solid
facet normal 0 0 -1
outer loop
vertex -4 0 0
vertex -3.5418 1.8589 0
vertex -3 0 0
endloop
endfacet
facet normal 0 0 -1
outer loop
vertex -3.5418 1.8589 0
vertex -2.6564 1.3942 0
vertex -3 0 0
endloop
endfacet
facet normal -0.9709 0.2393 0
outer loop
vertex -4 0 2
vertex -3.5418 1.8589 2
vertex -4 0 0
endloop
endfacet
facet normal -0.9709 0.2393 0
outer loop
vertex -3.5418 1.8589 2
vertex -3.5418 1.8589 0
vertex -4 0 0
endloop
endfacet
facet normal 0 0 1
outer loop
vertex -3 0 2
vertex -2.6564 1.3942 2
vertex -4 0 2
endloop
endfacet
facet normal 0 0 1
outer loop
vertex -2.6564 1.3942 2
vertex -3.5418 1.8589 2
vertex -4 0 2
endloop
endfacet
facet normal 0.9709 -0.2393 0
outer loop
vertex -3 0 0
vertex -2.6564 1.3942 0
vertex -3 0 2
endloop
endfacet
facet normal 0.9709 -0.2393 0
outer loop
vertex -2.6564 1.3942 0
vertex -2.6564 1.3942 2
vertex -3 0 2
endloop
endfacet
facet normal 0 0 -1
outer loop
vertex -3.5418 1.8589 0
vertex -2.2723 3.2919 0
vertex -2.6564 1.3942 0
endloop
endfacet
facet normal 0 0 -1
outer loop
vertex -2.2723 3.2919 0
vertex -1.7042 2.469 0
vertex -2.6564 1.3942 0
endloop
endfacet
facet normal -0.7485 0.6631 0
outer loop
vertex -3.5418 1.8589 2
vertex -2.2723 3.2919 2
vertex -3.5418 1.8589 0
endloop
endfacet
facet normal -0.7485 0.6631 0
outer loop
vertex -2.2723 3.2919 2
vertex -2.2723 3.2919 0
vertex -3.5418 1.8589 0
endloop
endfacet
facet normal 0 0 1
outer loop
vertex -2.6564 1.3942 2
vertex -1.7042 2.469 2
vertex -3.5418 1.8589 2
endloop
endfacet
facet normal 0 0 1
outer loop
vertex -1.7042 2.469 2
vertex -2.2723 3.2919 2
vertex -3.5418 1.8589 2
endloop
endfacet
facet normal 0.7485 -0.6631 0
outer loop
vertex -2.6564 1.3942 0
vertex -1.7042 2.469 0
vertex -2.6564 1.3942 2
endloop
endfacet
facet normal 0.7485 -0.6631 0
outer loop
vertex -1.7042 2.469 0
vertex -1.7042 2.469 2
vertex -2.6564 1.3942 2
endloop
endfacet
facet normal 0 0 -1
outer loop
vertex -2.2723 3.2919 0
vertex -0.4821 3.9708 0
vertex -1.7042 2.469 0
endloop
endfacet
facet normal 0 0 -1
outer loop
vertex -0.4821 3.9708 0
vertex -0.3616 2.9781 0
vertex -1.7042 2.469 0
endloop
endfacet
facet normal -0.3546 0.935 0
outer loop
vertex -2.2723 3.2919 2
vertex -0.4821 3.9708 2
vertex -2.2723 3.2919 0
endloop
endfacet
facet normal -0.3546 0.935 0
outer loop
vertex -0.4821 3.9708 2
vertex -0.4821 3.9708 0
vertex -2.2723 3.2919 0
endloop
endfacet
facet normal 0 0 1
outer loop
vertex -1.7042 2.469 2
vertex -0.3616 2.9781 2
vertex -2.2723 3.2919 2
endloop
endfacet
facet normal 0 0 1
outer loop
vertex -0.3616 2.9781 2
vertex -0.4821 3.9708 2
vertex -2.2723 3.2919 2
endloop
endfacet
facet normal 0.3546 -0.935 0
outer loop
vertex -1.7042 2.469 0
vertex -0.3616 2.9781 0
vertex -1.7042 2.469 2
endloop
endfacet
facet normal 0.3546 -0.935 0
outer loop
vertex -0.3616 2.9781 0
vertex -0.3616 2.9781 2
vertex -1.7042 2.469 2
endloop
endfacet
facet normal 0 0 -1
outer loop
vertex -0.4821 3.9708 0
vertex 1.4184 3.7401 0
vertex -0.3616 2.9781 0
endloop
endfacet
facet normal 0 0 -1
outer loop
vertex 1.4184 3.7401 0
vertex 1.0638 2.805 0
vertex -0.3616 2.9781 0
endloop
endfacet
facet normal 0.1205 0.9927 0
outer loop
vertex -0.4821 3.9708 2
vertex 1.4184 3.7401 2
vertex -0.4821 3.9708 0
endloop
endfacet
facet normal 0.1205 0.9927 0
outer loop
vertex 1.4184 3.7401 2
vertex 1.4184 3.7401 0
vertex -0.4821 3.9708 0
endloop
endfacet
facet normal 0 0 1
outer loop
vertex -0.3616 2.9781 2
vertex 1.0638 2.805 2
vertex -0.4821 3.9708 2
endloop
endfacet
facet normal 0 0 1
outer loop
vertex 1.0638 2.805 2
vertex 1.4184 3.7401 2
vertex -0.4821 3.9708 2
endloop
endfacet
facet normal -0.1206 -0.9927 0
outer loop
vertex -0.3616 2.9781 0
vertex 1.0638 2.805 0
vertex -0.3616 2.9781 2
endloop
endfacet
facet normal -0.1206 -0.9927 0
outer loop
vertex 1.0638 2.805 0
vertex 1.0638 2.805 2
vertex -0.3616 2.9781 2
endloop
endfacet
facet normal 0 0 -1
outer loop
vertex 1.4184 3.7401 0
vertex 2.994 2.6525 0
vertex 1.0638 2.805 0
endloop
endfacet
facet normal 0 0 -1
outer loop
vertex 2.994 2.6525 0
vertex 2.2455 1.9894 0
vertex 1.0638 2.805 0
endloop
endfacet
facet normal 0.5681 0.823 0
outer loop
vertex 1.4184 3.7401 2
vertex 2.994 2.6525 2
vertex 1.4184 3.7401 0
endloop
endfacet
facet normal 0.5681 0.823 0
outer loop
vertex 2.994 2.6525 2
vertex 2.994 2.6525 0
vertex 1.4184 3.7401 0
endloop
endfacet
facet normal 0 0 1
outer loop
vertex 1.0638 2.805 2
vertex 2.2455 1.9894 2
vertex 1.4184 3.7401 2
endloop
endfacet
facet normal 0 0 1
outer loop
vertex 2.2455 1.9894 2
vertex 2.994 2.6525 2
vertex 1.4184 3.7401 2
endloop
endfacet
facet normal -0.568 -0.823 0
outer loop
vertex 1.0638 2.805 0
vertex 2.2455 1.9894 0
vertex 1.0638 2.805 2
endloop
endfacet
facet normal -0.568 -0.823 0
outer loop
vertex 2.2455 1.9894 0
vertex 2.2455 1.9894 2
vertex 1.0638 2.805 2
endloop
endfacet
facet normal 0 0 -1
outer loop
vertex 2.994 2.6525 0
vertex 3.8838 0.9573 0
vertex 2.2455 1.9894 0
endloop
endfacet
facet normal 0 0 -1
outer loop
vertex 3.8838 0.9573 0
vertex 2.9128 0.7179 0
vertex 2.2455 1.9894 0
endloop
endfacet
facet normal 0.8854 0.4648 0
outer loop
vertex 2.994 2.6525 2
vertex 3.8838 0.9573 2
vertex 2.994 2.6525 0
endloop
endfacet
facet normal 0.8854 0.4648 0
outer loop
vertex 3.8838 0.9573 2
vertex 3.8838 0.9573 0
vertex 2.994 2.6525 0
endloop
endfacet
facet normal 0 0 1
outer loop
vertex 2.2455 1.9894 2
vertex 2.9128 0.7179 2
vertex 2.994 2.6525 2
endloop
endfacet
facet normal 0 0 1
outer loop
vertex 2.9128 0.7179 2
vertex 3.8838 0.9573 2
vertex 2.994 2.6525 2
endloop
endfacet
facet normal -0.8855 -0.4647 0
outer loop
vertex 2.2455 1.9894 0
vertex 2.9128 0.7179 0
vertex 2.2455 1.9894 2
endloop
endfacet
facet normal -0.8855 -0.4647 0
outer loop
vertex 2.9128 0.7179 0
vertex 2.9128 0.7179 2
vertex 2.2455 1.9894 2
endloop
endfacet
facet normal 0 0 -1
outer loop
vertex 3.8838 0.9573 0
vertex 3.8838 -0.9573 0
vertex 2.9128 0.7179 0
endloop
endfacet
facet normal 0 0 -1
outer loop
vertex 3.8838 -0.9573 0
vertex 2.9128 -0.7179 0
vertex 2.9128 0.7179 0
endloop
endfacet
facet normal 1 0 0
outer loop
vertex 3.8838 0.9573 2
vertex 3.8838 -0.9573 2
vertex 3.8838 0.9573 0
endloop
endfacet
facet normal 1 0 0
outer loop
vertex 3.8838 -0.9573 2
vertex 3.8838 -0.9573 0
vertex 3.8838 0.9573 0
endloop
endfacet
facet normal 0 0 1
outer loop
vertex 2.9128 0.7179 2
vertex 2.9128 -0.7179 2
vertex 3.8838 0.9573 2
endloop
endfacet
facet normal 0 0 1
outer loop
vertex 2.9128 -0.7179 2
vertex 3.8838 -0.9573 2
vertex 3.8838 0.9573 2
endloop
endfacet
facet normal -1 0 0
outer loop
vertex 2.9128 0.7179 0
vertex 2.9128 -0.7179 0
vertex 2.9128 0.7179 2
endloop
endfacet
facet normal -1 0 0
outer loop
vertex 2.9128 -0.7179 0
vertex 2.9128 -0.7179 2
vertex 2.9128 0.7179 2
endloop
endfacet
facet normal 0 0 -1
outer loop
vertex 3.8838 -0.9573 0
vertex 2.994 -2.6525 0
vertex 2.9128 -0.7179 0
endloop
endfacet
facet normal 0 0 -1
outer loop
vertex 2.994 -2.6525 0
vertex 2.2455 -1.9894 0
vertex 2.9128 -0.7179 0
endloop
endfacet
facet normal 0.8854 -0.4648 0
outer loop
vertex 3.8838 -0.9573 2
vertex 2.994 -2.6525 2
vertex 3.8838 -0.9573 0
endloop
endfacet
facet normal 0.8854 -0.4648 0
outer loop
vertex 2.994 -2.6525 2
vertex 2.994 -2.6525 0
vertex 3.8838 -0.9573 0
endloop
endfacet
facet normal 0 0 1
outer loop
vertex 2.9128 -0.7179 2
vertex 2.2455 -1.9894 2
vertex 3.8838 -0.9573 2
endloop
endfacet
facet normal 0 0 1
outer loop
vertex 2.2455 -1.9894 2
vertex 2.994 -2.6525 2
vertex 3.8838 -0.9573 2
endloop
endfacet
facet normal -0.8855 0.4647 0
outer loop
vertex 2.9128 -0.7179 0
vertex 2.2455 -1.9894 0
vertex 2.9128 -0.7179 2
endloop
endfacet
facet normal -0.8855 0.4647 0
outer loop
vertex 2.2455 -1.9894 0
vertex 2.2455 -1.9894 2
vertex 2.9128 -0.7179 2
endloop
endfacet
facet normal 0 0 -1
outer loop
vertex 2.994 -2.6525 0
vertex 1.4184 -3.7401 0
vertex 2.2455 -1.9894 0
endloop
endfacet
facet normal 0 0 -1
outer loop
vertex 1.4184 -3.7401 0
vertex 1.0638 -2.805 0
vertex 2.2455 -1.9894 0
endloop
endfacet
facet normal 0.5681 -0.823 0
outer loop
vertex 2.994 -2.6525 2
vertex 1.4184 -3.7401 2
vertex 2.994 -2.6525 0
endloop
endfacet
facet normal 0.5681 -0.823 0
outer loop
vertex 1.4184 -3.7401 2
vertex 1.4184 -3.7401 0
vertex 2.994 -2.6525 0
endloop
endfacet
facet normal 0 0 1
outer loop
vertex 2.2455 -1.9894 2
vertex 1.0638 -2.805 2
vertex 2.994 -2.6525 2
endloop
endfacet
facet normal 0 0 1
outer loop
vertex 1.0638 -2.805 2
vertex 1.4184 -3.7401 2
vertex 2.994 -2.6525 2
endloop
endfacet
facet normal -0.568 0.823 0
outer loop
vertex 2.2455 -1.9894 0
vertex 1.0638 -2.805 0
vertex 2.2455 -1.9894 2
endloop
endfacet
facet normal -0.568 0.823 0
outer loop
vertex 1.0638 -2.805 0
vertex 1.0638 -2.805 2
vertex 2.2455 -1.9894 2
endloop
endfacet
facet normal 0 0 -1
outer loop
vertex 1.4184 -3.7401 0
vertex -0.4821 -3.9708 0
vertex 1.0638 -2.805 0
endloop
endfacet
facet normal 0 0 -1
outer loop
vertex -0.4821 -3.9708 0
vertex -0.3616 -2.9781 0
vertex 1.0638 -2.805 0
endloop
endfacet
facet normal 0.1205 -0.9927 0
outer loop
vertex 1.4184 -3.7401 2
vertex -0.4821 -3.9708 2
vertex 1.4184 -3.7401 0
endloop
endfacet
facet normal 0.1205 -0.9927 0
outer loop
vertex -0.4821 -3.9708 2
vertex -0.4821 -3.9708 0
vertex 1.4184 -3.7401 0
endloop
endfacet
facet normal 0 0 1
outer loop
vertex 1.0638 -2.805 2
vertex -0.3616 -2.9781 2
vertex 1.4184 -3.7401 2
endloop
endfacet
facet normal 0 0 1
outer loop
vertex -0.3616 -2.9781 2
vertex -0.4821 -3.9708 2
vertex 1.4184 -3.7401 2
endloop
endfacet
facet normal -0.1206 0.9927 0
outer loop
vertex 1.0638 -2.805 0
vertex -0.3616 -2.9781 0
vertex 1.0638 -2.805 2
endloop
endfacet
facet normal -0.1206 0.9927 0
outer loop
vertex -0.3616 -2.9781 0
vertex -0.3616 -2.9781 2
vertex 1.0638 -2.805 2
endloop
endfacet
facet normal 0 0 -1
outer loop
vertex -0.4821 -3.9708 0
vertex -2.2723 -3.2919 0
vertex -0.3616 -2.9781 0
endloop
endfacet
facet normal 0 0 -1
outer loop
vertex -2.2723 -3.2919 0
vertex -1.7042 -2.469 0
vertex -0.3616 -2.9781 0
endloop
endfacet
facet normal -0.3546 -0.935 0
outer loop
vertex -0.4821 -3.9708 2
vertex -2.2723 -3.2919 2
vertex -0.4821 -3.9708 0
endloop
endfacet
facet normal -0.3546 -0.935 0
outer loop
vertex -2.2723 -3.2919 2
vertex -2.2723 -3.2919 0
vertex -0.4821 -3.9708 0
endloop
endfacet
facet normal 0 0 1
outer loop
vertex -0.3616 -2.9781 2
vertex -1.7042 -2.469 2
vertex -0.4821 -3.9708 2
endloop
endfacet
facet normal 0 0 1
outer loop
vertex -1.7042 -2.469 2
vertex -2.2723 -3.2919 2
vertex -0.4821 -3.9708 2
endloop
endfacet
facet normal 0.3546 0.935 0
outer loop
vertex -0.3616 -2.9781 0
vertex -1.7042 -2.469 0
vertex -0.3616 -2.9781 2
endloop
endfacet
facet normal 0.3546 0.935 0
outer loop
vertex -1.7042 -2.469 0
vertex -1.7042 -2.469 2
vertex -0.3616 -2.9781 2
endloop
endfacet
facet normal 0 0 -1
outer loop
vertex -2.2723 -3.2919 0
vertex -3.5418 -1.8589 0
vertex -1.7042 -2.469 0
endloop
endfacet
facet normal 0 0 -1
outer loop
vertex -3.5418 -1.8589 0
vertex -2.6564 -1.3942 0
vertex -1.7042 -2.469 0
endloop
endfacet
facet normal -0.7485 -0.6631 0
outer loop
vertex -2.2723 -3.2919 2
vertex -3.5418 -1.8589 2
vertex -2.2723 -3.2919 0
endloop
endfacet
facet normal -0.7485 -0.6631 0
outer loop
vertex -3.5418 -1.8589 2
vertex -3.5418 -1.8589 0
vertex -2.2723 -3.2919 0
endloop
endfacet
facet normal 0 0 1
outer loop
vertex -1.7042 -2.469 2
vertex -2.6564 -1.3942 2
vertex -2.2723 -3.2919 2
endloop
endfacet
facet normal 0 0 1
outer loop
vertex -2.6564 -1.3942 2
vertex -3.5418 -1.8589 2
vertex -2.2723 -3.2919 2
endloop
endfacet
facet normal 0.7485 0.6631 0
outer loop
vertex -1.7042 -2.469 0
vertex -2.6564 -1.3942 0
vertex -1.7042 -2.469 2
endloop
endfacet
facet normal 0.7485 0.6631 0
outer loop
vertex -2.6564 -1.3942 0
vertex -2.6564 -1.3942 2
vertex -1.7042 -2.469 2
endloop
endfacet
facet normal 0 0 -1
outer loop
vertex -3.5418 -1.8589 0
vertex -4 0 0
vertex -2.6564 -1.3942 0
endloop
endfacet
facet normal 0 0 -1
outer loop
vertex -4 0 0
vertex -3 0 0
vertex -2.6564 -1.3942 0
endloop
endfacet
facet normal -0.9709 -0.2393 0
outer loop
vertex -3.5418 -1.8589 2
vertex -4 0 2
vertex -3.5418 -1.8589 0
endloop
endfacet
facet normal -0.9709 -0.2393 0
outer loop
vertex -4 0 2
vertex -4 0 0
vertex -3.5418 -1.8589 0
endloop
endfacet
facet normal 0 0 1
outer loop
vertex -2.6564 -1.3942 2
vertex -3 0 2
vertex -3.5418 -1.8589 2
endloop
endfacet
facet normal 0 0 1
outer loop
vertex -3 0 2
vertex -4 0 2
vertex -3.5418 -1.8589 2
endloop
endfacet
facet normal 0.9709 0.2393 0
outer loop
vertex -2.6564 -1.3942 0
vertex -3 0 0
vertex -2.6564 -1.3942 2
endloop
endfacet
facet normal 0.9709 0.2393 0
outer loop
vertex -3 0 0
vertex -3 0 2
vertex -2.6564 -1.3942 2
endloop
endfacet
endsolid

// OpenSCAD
// fragments from the default $fa / $fs
rotate_extrude() translate([3, 0]) square([1, 2]);
